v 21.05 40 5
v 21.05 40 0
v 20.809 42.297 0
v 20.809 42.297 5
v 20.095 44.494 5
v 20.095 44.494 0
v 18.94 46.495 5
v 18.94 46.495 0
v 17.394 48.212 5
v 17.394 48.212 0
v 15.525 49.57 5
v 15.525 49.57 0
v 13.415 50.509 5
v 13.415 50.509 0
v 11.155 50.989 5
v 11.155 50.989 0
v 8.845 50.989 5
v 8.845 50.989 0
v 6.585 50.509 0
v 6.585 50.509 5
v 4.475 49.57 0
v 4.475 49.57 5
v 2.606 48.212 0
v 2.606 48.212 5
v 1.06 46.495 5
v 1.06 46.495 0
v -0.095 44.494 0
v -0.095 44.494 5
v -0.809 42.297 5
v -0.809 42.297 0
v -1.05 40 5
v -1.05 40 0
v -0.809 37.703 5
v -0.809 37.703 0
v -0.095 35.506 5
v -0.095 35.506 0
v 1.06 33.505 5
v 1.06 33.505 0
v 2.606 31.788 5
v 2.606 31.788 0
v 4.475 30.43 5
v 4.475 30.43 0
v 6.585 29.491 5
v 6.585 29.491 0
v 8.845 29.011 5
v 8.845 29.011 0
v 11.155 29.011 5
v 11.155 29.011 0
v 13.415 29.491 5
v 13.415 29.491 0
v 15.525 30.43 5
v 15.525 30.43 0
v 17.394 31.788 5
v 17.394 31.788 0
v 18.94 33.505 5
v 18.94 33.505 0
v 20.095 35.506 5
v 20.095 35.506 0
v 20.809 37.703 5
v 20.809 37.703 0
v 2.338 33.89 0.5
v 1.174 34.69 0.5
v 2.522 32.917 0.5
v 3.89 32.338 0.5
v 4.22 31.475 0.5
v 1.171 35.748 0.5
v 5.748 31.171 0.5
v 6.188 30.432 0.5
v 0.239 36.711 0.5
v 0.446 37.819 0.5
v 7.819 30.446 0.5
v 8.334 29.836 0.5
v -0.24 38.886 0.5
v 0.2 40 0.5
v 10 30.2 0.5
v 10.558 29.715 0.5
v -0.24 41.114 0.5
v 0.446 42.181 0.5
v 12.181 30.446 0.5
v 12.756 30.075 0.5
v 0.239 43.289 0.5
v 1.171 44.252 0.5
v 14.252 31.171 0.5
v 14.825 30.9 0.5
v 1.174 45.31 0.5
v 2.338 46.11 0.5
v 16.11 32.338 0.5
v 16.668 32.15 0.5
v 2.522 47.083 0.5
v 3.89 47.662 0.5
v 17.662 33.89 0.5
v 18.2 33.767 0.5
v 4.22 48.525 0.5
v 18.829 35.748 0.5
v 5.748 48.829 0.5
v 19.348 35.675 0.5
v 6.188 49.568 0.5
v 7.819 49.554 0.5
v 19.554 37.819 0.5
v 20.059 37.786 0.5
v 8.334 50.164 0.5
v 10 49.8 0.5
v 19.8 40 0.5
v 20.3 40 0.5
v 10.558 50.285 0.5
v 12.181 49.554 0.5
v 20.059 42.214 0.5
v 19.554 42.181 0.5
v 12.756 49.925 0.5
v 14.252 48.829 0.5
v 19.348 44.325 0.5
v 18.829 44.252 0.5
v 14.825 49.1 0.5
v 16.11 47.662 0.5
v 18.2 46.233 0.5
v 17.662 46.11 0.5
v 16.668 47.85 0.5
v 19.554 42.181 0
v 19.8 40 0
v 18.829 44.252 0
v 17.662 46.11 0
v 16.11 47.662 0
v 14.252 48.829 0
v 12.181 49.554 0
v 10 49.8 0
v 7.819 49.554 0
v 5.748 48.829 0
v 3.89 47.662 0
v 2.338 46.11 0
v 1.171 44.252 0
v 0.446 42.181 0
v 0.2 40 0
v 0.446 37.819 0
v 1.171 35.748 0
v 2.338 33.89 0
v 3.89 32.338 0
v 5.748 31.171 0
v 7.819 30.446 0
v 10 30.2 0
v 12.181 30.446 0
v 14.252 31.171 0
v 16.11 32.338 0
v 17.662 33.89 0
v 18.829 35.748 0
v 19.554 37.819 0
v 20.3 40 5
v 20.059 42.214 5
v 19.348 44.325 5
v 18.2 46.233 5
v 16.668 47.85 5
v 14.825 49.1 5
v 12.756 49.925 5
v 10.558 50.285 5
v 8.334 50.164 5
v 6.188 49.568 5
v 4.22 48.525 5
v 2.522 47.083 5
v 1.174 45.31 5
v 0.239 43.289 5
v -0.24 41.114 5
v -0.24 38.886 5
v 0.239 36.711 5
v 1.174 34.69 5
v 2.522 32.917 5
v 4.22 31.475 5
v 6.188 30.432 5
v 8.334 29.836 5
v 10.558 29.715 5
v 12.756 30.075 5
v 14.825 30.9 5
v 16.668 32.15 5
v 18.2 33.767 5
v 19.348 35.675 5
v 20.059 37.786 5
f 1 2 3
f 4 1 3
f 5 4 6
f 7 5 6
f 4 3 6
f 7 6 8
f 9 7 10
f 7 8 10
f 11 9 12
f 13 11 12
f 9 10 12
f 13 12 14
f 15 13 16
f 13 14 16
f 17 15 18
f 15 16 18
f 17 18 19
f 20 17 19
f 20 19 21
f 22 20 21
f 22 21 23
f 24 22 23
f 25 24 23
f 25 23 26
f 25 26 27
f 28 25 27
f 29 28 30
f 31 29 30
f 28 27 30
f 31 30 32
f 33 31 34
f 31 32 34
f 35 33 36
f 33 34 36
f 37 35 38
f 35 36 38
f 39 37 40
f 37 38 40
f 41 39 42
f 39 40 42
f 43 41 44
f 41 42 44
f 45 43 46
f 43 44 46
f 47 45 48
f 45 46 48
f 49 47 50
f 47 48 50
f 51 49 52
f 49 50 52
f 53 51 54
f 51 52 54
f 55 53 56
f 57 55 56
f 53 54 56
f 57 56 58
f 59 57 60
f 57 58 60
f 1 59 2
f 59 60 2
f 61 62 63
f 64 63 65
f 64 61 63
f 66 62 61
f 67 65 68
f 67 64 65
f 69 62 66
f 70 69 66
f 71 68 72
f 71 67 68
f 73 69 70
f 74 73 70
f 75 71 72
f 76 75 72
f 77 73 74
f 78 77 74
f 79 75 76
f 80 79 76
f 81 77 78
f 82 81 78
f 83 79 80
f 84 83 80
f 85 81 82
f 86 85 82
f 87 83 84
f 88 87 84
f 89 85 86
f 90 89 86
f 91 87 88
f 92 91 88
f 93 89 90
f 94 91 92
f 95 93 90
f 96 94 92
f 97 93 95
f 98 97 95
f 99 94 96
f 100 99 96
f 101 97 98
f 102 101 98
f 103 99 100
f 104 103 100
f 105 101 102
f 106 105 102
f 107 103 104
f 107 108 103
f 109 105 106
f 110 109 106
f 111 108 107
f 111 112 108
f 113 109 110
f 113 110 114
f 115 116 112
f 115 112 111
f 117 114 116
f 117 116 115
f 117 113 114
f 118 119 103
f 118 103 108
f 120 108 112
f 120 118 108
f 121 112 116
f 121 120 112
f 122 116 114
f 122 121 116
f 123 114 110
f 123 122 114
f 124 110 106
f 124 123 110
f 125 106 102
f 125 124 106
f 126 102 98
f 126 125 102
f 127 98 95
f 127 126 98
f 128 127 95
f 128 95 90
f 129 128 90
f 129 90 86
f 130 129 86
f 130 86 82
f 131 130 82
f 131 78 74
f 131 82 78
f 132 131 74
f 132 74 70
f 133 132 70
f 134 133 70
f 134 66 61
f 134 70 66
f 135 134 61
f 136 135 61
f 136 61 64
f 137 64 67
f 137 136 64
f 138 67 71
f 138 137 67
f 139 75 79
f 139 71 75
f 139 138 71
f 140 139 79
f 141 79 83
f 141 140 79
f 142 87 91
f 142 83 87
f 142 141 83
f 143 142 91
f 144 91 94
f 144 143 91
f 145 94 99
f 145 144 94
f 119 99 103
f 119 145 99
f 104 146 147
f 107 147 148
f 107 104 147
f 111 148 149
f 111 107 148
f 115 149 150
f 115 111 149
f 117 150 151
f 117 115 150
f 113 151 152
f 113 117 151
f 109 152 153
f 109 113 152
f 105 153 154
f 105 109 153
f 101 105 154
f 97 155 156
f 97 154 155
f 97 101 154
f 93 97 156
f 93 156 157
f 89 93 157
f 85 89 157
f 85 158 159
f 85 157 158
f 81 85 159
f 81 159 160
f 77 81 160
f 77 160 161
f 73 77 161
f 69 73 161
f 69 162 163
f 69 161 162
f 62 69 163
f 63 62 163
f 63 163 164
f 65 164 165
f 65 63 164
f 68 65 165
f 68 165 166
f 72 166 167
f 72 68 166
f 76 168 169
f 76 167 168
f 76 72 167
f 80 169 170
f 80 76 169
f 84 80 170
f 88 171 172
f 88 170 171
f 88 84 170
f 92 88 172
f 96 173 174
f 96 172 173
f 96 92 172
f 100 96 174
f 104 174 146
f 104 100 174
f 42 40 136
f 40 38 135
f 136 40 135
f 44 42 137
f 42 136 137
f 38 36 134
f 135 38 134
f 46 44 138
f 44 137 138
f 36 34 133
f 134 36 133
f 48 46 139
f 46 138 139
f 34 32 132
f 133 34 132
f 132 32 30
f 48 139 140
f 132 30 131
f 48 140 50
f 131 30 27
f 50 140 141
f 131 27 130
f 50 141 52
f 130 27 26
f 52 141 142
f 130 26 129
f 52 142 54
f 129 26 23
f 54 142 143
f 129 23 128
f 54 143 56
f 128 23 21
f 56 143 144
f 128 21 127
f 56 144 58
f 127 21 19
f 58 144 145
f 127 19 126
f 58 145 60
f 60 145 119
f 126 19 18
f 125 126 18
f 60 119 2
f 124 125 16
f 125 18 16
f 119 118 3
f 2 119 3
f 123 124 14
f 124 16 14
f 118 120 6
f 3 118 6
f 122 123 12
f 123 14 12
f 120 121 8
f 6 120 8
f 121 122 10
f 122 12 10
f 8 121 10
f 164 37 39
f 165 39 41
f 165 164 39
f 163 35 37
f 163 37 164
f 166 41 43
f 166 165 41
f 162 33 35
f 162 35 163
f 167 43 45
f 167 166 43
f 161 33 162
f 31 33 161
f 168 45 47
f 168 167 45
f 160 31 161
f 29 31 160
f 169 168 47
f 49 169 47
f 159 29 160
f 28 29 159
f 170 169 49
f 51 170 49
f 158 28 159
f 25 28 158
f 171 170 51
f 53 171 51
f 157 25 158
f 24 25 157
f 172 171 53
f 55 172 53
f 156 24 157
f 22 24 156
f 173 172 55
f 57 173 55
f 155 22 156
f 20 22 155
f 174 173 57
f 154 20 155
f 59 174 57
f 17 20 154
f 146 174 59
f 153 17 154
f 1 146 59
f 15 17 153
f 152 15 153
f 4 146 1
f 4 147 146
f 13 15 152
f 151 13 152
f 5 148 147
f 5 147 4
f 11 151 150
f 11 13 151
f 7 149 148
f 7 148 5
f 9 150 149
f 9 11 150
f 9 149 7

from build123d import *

# Parameters (mm, degrees)
CYLINDER014_R     = 9.8
CYLINDER014_DEPTH = 10
CYLINDER013_R     = 10.3
CYLINDER013_DEPTH = 10
CYLINDER012_R     = 11.05
CYLINDER012_DEPTH = 5


with BuildPart() as redtmp04:
    # Cylinder014 → Cylinder014 (new body)
    with BuildSketch(Plane.XY):
        Circle(CYLINDER014_R)
    extrude(amount=CYLINDER014_DEPTH)


with BuildPart() as redtmp02:
    # Cylinder013 → Cylinder013 (new body)
    with BuildSketch(Plane.XY.offset(0.5)):
        Circle(CYLINDER013_R)
    extrude(amount=CYLINDER013_DEPTH)


with BuildPart() as redbase:
    # Cylinder012 → Cylinder012 (new body)
    with BuildSketch(Plane.XY):
        Circle(CYLINDER012_R)
    extrude(amount=CYLINDER012_DEPTH)

    # Cut008: cut RedTmp02
    add(redtmp02.part, mode=Mode.SUBTRACT)

    # Cut009: cut RedTmp04
    add(redtmp04.part, mode=Mode.SUBTRACT)


with BuildPart() as redbase_1:
    # Cut009 placement: moved
    add(redbase.part.moved(Location((10, 40, 0))))


solid = redbase_1.part
